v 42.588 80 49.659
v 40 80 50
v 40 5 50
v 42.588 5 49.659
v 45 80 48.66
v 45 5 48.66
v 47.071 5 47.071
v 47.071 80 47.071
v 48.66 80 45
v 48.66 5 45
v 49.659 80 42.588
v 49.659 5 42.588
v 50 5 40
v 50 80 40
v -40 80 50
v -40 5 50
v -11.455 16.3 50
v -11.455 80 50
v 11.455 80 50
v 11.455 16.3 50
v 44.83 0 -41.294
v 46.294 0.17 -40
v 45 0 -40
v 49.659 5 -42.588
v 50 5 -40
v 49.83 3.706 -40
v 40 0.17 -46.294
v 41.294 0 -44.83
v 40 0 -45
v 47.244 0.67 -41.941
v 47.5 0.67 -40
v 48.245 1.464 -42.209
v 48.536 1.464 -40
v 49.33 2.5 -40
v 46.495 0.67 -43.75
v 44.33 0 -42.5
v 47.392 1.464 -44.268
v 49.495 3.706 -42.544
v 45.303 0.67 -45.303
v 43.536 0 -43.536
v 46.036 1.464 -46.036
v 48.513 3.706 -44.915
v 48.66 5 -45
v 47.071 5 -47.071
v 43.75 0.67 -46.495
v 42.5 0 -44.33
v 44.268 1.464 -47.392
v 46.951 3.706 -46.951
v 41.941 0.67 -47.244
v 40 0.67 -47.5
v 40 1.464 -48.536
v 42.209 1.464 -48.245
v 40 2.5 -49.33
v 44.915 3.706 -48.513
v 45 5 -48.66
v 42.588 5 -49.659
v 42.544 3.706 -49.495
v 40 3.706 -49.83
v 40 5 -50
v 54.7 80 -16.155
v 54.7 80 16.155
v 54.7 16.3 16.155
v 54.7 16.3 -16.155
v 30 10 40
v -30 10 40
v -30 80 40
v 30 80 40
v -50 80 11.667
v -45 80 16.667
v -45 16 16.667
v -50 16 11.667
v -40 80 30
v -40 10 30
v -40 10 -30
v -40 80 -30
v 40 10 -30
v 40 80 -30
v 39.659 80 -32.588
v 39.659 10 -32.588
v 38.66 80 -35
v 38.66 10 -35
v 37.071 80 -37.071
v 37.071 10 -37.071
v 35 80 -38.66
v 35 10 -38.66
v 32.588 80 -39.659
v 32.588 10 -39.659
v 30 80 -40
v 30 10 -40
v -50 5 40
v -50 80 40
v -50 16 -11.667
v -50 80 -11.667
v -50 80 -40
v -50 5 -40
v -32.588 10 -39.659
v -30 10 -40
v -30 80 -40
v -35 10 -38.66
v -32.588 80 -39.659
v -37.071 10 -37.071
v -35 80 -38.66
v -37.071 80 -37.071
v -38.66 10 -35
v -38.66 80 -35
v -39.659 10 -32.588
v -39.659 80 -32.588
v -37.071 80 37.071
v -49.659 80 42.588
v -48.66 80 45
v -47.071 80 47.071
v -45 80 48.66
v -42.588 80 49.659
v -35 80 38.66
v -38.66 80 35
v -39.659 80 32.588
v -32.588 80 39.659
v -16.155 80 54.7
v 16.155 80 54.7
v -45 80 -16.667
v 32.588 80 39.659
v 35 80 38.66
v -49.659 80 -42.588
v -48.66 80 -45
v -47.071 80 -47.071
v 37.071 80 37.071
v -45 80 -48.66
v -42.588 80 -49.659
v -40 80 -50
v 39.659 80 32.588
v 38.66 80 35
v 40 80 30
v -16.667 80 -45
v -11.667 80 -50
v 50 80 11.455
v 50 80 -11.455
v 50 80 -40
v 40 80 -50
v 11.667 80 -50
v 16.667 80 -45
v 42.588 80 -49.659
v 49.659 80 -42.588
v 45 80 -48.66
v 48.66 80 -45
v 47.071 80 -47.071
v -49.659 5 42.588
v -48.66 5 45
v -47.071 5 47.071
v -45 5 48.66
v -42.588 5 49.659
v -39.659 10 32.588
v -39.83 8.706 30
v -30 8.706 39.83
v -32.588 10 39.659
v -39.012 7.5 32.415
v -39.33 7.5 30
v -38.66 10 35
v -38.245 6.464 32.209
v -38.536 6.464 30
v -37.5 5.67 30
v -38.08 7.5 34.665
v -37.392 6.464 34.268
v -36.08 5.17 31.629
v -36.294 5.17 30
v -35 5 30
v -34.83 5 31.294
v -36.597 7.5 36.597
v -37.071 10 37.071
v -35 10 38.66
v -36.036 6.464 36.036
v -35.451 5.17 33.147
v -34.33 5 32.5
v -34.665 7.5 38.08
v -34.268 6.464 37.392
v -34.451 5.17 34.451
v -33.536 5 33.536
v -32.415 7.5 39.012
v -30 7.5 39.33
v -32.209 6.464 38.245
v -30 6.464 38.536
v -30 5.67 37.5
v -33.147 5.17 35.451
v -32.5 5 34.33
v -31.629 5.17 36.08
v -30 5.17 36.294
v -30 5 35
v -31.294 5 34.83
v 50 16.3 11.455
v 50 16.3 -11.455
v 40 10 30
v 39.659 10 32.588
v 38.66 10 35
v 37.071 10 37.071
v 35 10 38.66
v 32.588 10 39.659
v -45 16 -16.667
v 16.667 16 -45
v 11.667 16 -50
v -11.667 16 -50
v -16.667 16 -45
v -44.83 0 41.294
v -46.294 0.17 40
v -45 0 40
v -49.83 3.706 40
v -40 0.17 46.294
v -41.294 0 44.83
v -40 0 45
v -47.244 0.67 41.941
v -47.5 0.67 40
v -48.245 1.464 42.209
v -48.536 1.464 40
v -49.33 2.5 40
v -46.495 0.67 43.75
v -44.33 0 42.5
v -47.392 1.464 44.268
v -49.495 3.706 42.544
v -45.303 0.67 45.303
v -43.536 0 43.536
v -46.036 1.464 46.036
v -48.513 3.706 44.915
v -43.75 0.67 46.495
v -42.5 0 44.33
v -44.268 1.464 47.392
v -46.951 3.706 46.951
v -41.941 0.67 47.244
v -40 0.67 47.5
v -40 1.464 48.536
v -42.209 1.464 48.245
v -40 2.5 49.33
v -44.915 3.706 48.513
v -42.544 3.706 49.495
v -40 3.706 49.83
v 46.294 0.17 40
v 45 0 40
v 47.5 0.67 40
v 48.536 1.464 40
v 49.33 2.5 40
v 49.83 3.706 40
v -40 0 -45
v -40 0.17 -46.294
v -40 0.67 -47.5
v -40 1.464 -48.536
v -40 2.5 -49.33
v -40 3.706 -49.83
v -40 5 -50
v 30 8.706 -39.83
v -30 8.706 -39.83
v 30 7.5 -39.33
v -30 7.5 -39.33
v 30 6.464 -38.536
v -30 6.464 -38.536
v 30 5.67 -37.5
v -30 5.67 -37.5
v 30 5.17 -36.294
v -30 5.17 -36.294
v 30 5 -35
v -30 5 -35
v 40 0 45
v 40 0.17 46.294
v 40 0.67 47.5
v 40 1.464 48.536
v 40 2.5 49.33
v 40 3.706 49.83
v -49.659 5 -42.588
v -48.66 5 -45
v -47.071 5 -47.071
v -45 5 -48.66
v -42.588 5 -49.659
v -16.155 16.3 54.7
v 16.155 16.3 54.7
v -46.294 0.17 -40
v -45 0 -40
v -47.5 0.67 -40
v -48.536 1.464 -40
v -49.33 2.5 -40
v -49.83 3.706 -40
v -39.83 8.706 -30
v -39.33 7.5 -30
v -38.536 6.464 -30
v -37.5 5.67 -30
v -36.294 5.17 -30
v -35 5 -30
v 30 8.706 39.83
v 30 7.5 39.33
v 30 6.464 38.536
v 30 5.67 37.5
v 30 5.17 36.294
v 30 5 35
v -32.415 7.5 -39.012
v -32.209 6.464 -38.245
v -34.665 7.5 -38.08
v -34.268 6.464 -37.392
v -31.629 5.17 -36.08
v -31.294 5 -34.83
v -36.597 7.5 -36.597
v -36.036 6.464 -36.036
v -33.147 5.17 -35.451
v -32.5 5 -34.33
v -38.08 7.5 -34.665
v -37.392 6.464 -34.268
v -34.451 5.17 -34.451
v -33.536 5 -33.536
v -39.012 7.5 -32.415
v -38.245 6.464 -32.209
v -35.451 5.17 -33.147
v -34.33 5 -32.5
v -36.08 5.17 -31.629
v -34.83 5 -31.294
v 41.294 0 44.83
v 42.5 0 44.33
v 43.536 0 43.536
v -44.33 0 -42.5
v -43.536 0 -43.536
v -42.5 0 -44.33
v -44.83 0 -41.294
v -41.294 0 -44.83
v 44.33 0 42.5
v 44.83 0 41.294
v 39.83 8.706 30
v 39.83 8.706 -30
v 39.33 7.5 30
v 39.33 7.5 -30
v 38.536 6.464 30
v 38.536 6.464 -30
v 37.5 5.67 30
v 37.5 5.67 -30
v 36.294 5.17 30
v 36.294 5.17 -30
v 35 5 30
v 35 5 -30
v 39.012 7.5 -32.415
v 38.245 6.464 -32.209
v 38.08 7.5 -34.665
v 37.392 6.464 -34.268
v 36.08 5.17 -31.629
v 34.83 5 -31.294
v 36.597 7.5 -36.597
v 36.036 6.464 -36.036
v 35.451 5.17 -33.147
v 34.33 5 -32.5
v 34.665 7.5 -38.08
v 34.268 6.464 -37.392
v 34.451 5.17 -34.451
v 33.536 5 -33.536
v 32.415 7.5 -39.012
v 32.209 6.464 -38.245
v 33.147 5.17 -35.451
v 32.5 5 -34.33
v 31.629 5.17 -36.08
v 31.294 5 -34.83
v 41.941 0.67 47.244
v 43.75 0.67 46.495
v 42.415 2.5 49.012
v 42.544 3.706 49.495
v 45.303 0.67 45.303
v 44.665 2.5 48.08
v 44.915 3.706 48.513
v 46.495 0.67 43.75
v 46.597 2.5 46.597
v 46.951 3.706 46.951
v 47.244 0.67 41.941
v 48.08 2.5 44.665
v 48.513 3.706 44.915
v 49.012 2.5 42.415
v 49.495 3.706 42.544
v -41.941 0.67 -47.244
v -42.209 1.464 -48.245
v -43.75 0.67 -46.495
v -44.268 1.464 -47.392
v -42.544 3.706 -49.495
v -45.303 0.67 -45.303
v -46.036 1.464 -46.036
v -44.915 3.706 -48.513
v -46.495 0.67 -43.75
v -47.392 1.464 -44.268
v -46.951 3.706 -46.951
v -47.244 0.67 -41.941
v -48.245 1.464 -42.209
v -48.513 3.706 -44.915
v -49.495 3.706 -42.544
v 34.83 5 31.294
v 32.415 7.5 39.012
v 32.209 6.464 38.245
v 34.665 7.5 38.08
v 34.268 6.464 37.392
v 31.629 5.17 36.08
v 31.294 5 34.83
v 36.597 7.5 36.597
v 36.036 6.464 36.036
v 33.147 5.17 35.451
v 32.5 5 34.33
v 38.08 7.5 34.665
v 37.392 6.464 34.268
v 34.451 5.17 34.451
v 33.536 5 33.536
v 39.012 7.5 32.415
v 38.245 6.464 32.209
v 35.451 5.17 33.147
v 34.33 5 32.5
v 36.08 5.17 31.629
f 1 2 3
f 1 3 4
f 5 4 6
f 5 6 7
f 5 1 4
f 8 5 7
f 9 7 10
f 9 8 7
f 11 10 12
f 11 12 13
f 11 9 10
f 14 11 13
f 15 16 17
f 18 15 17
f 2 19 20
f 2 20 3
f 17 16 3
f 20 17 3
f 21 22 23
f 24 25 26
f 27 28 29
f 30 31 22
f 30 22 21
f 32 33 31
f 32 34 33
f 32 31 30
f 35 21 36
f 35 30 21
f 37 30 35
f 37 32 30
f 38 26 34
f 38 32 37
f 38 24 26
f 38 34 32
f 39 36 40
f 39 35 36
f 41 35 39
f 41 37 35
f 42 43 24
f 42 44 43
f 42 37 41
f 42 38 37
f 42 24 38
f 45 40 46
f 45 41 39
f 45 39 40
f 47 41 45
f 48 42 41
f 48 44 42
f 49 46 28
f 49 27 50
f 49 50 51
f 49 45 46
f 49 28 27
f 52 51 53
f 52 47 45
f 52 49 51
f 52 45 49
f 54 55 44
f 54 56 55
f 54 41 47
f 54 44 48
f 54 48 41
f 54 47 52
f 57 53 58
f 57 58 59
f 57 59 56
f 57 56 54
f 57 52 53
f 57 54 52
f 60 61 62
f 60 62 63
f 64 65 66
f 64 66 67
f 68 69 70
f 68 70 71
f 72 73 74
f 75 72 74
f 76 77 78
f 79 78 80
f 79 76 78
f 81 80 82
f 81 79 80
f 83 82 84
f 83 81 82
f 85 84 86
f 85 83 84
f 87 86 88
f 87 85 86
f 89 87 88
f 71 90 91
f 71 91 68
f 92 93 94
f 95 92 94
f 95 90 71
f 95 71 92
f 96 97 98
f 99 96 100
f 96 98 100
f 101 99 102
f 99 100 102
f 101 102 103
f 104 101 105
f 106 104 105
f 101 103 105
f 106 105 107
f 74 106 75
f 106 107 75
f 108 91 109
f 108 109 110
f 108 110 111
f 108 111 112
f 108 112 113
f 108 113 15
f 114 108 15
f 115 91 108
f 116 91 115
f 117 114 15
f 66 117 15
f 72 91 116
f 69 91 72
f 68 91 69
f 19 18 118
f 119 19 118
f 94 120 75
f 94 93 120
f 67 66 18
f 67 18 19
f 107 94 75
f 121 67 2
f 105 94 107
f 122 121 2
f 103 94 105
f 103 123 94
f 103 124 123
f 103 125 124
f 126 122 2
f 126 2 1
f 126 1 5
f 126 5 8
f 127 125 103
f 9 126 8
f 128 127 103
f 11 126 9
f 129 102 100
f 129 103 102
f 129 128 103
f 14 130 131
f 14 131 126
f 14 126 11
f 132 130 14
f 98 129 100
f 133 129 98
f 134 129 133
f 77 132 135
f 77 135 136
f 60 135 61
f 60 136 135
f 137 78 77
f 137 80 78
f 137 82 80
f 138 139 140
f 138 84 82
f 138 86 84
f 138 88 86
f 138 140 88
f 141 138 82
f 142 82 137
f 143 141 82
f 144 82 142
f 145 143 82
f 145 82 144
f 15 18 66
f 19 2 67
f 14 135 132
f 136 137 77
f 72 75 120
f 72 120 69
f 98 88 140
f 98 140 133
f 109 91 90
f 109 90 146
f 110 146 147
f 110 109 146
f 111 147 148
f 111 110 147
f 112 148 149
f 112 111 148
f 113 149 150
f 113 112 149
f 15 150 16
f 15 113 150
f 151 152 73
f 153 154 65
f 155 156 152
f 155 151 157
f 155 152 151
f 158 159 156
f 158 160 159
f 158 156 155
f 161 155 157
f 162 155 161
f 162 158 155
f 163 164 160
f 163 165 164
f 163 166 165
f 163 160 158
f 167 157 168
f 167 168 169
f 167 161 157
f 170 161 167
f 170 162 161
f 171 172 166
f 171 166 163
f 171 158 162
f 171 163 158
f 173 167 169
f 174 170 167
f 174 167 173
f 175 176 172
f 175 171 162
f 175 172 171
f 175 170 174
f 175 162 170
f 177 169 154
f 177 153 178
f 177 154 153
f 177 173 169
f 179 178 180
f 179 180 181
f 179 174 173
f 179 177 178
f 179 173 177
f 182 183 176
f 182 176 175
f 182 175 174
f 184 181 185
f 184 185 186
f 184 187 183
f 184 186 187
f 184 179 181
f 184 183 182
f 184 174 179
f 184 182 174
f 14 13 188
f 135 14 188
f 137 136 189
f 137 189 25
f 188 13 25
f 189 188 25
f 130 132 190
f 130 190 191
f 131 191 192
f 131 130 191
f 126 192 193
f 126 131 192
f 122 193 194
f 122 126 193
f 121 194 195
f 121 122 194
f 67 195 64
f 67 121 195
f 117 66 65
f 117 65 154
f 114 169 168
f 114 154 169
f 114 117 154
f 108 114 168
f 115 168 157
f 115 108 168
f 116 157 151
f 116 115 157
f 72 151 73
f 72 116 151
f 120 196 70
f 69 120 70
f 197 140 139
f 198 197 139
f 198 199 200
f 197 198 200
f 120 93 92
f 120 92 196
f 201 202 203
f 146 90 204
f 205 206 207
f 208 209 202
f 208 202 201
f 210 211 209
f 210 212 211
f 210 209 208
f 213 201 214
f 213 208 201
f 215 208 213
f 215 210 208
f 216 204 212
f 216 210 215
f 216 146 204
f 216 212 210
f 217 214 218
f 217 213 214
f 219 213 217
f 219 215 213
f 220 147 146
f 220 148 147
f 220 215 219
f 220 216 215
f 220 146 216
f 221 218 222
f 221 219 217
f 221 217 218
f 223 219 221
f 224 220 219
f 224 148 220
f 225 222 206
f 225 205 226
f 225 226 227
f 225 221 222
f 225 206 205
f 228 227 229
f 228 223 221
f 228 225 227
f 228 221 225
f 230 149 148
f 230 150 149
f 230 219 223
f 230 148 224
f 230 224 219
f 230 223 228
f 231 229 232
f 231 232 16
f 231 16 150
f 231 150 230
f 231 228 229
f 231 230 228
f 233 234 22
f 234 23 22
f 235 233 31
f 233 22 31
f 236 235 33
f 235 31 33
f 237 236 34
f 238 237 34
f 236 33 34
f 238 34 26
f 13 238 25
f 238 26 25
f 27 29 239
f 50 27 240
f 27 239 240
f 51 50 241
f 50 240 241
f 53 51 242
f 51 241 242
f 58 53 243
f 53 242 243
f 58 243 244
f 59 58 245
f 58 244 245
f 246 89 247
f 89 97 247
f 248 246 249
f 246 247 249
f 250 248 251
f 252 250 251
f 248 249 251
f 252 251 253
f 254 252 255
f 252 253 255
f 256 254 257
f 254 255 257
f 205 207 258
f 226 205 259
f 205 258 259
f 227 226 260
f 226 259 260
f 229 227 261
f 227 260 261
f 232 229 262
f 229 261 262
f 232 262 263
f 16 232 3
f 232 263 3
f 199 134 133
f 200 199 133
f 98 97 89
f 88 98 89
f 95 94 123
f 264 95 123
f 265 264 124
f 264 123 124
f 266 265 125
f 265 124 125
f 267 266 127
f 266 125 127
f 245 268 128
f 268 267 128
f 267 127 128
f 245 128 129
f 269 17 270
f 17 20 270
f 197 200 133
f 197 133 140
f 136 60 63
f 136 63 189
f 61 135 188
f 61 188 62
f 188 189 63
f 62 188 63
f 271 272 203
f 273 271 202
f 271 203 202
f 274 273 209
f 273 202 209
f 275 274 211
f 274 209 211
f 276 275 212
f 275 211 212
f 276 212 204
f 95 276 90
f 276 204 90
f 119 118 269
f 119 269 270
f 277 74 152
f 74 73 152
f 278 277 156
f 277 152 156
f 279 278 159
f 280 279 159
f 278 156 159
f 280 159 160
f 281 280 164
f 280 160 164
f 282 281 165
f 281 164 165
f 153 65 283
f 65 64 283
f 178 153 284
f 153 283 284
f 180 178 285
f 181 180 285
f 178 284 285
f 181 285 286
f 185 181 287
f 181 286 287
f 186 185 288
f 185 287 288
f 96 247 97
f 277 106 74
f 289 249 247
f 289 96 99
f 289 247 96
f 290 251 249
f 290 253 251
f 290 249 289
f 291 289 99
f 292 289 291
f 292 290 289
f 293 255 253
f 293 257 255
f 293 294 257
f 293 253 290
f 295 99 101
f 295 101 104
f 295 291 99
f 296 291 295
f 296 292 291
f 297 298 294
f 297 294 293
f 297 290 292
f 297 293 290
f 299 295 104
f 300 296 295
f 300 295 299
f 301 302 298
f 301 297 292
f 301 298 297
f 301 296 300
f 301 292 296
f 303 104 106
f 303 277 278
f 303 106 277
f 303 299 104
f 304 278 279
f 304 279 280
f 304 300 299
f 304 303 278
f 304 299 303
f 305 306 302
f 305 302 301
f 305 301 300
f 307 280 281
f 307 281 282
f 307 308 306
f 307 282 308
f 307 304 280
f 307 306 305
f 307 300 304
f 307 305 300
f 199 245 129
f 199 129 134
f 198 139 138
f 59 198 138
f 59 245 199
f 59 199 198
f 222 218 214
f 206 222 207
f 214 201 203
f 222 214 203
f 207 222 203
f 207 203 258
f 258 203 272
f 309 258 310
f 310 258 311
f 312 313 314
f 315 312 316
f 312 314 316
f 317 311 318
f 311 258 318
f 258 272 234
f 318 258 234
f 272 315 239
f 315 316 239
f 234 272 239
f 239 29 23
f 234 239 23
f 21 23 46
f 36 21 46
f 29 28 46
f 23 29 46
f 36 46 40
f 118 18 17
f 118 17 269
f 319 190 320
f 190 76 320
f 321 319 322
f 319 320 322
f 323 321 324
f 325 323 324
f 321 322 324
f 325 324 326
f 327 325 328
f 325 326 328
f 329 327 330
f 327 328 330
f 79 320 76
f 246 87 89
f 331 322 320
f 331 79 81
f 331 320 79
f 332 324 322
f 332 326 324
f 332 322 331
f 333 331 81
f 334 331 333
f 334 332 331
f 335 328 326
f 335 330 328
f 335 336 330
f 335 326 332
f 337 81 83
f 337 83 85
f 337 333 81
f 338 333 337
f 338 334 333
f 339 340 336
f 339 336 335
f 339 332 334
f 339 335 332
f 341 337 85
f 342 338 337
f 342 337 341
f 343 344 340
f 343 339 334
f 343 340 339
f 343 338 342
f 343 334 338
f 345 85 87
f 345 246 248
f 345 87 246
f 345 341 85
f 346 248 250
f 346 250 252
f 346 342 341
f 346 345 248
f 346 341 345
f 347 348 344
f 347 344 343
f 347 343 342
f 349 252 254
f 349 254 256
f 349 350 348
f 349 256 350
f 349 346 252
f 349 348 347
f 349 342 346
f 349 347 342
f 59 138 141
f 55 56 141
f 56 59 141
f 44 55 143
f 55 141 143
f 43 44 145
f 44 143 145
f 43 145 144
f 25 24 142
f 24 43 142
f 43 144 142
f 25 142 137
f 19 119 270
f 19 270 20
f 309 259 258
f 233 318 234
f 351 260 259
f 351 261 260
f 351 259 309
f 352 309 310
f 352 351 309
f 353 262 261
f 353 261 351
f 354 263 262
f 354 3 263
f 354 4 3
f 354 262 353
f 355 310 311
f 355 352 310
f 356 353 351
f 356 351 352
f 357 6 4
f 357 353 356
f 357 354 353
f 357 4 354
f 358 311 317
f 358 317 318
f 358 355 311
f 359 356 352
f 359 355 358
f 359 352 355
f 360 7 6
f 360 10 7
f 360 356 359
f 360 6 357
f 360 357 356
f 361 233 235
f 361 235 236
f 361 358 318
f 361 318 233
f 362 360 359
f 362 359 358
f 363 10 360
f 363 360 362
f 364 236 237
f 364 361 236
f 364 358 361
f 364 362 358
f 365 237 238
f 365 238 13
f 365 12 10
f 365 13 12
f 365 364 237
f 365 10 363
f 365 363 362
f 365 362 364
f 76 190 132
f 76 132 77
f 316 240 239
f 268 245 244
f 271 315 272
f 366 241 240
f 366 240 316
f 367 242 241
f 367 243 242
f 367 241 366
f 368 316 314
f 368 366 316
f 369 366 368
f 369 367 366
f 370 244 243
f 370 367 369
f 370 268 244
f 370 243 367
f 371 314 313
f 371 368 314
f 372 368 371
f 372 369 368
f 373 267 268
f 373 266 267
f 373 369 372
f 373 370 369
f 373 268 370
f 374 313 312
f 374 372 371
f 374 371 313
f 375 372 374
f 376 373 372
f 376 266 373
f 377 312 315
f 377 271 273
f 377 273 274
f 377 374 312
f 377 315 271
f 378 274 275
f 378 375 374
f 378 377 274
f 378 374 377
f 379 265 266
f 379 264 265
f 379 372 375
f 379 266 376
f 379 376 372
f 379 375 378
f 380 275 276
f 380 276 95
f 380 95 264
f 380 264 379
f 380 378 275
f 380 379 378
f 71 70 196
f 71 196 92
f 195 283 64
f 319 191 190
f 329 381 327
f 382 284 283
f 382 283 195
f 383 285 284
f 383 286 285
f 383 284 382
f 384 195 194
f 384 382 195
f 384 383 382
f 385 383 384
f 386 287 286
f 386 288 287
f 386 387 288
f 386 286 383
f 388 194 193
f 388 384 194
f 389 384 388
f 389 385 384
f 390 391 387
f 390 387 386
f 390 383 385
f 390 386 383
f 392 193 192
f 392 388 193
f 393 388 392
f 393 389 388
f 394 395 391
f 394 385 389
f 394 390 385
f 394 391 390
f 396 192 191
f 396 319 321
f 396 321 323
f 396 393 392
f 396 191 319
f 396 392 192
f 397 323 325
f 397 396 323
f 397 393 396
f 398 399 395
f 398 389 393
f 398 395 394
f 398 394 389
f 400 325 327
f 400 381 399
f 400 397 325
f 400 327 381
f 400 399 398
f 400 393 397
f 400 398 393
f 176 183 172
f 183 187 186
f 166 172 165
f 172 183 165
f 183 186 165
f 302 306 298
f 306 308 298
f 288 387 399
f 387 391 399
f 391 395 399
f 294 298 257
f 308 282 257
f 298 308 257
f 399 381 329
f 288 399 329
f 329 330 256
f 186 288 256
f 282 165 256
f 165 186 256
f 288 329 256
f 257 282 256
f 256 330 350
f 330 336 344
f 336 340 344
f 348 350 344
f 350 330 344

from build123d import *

# Parameters (mm, degrees)
SKETCH1_W                 = 100
SKETCH1_H                 = 100
BOSS_EXTRUDE1_DEPTH       = 80
SHELL1_T                  = -10
SHELL1_THICKNESS_2_FACE_W = 80
SHELL1_THICKNESS_2_FACE_H = 80
SHELL1_THICKNESS_2_DEPTH  = 5
CUT_EXTRUDE1_DEPTH        = 64
BOSS_EXTRUDE2_DEPTH       = 63.7
CUT_EXTRUDE2_DEPTH        = 64
BOSS_EXTRUDE3_DEPTH       = 63.7
FILLET1_R                 = 10
FILLET2_R                 = 5


with BuildPart() as part:
    # Sketch1 → Boss-Extrude1 (new body)
    with BuildSketch(Plane(origin=(0, 0, 0), x_dir=(1, 0, 0), z_dir=(0, 1, 0))):
        Rectangle(SKETCH1_W, SKETCH1_H)
    extrude(amount=BOSS_EXTRUDE1_DEPTH)

    # Shell1
    shell1_openings = [part.faces().sort_by_distance(p)[0] for p in [
        (0, 80, 0),
    ]]
    offset(amount=SHELL1_T, openings=shell1_openings, kind=Kind.INTERSECTION)

    # Shell1 thickness 2 face (on inner face of the shell) → Shell1 thickness 2 (cut)
    with BuildSketch(Plane(origin=(0, 10, 0), x_dir=(0, 0, -1), z_dir=(0, -1, 0))):
        Rectangle(SHELL1_THICKNESS_2_FACE_W, SHELL1_THICKNESS_2_FACE_H)
    extrude(amount=SHELL1_THICKNESS_2_DEPTH, mode=Mode.SUBTRACT)

    # Sketch2 → Cut-Extrude1 (cut)
    with BuildSketch(Plane(origin=(0, 80, 0), x_dir=(1, 0, 0), z_dir=(0, 1, 0))):
        Polygon((-11.666666667, 50), (-16.666666667, 45), (16.666666667, 45), (11.666666667, 50), align=None)
    extrude(amount=-CUT_EXTRUDE1_DEPTH, mode=Mode.SUBTRACT)

    # Sketch3 → Boss-Extrude2 (add)
    with BuildSketch(Plane(origin=(0, 80, 0), x_dir=(1, 0, 0), z_dir=(0, 1, 0))):
        Polygon((-11.454534632, -50), (-16.154534632, -54.7), (16.154534632, -54.7), (11.454534632, -50), align=None)
    extrude(amount=-BOSS_EXTRUDE2_DEPTH)

    # Sketch4 → Cut-Extrude2 (cut)
    with BuildSketch(Plane(origin=(0, 80, 0), x_dir=(1, 0, 0), z_dir=(0, 1, 0))):
        Polygon((-45, 16.666666667), (-45, -16.666666667), (-50, -11.666666667), (-50, 11.666666667), align=None)
    extrude(amount=-CUT_EXTRUDE2_DEPTH, mode=Mode.SUBTRACT)

    # Sketch5 → Boss-Extrude3 (add)
    with BuildSketch(Plane(origin=(0, 80, 0), x_dir=(1, 0, 0), z_dir=(0, 1, 0))):
        Polygon((50, 11.454534632), (50, -11.454534632), (54.7, -16.154534632), (54.7, 16.154534632), align=None)
    extrude(amount=-BOSS_EXTRUDE3_DEPTH)

    # Fillet1
    fillet1_edges = [part.edges().sort_by_distance(p)[0] for p in [
        (40, 42.5, 40),
        (40, 42.5, -40),
        (-40, 42.5, -40),
        (-40, 42.5, 40),
        (50, 40, 50),
        (-50, 40, 50),
        (-50, 40, -50),
        (50, 40, -50),
    ]]
    fillet(fillet1_edges, radius=FILLET1_R)

    # Fillet2
    fillet2_edges = [part.edges().sort_by_distance(p)[0] for p in [
        (50, 0, 0),
        (0, 0, 50),
        (-50, 0, 0),
        (47.071067812, 0, 47.071067812),
        (-47.071067812, 0, 47.071067812),
        (-47.071067812, 0, -47.071067812),
        (47.071067812, 0, -47.071067812),
        (40, 5, 0),
        (0, 5, -40),
        (-40, 5, 0),
        (0, 5, 40),
        (37.071067812, 5, 37.071067812),
        (-37.071067812, 5, 37.071067812),
        (-37.071067812, 5, -37.071067812),
        (37.071067812, 5, -37.071067812),
        (0, 0, -50),
    ]]
    fillet(fillet2_edges, radius=FILLET2_R)


solid = part.part
